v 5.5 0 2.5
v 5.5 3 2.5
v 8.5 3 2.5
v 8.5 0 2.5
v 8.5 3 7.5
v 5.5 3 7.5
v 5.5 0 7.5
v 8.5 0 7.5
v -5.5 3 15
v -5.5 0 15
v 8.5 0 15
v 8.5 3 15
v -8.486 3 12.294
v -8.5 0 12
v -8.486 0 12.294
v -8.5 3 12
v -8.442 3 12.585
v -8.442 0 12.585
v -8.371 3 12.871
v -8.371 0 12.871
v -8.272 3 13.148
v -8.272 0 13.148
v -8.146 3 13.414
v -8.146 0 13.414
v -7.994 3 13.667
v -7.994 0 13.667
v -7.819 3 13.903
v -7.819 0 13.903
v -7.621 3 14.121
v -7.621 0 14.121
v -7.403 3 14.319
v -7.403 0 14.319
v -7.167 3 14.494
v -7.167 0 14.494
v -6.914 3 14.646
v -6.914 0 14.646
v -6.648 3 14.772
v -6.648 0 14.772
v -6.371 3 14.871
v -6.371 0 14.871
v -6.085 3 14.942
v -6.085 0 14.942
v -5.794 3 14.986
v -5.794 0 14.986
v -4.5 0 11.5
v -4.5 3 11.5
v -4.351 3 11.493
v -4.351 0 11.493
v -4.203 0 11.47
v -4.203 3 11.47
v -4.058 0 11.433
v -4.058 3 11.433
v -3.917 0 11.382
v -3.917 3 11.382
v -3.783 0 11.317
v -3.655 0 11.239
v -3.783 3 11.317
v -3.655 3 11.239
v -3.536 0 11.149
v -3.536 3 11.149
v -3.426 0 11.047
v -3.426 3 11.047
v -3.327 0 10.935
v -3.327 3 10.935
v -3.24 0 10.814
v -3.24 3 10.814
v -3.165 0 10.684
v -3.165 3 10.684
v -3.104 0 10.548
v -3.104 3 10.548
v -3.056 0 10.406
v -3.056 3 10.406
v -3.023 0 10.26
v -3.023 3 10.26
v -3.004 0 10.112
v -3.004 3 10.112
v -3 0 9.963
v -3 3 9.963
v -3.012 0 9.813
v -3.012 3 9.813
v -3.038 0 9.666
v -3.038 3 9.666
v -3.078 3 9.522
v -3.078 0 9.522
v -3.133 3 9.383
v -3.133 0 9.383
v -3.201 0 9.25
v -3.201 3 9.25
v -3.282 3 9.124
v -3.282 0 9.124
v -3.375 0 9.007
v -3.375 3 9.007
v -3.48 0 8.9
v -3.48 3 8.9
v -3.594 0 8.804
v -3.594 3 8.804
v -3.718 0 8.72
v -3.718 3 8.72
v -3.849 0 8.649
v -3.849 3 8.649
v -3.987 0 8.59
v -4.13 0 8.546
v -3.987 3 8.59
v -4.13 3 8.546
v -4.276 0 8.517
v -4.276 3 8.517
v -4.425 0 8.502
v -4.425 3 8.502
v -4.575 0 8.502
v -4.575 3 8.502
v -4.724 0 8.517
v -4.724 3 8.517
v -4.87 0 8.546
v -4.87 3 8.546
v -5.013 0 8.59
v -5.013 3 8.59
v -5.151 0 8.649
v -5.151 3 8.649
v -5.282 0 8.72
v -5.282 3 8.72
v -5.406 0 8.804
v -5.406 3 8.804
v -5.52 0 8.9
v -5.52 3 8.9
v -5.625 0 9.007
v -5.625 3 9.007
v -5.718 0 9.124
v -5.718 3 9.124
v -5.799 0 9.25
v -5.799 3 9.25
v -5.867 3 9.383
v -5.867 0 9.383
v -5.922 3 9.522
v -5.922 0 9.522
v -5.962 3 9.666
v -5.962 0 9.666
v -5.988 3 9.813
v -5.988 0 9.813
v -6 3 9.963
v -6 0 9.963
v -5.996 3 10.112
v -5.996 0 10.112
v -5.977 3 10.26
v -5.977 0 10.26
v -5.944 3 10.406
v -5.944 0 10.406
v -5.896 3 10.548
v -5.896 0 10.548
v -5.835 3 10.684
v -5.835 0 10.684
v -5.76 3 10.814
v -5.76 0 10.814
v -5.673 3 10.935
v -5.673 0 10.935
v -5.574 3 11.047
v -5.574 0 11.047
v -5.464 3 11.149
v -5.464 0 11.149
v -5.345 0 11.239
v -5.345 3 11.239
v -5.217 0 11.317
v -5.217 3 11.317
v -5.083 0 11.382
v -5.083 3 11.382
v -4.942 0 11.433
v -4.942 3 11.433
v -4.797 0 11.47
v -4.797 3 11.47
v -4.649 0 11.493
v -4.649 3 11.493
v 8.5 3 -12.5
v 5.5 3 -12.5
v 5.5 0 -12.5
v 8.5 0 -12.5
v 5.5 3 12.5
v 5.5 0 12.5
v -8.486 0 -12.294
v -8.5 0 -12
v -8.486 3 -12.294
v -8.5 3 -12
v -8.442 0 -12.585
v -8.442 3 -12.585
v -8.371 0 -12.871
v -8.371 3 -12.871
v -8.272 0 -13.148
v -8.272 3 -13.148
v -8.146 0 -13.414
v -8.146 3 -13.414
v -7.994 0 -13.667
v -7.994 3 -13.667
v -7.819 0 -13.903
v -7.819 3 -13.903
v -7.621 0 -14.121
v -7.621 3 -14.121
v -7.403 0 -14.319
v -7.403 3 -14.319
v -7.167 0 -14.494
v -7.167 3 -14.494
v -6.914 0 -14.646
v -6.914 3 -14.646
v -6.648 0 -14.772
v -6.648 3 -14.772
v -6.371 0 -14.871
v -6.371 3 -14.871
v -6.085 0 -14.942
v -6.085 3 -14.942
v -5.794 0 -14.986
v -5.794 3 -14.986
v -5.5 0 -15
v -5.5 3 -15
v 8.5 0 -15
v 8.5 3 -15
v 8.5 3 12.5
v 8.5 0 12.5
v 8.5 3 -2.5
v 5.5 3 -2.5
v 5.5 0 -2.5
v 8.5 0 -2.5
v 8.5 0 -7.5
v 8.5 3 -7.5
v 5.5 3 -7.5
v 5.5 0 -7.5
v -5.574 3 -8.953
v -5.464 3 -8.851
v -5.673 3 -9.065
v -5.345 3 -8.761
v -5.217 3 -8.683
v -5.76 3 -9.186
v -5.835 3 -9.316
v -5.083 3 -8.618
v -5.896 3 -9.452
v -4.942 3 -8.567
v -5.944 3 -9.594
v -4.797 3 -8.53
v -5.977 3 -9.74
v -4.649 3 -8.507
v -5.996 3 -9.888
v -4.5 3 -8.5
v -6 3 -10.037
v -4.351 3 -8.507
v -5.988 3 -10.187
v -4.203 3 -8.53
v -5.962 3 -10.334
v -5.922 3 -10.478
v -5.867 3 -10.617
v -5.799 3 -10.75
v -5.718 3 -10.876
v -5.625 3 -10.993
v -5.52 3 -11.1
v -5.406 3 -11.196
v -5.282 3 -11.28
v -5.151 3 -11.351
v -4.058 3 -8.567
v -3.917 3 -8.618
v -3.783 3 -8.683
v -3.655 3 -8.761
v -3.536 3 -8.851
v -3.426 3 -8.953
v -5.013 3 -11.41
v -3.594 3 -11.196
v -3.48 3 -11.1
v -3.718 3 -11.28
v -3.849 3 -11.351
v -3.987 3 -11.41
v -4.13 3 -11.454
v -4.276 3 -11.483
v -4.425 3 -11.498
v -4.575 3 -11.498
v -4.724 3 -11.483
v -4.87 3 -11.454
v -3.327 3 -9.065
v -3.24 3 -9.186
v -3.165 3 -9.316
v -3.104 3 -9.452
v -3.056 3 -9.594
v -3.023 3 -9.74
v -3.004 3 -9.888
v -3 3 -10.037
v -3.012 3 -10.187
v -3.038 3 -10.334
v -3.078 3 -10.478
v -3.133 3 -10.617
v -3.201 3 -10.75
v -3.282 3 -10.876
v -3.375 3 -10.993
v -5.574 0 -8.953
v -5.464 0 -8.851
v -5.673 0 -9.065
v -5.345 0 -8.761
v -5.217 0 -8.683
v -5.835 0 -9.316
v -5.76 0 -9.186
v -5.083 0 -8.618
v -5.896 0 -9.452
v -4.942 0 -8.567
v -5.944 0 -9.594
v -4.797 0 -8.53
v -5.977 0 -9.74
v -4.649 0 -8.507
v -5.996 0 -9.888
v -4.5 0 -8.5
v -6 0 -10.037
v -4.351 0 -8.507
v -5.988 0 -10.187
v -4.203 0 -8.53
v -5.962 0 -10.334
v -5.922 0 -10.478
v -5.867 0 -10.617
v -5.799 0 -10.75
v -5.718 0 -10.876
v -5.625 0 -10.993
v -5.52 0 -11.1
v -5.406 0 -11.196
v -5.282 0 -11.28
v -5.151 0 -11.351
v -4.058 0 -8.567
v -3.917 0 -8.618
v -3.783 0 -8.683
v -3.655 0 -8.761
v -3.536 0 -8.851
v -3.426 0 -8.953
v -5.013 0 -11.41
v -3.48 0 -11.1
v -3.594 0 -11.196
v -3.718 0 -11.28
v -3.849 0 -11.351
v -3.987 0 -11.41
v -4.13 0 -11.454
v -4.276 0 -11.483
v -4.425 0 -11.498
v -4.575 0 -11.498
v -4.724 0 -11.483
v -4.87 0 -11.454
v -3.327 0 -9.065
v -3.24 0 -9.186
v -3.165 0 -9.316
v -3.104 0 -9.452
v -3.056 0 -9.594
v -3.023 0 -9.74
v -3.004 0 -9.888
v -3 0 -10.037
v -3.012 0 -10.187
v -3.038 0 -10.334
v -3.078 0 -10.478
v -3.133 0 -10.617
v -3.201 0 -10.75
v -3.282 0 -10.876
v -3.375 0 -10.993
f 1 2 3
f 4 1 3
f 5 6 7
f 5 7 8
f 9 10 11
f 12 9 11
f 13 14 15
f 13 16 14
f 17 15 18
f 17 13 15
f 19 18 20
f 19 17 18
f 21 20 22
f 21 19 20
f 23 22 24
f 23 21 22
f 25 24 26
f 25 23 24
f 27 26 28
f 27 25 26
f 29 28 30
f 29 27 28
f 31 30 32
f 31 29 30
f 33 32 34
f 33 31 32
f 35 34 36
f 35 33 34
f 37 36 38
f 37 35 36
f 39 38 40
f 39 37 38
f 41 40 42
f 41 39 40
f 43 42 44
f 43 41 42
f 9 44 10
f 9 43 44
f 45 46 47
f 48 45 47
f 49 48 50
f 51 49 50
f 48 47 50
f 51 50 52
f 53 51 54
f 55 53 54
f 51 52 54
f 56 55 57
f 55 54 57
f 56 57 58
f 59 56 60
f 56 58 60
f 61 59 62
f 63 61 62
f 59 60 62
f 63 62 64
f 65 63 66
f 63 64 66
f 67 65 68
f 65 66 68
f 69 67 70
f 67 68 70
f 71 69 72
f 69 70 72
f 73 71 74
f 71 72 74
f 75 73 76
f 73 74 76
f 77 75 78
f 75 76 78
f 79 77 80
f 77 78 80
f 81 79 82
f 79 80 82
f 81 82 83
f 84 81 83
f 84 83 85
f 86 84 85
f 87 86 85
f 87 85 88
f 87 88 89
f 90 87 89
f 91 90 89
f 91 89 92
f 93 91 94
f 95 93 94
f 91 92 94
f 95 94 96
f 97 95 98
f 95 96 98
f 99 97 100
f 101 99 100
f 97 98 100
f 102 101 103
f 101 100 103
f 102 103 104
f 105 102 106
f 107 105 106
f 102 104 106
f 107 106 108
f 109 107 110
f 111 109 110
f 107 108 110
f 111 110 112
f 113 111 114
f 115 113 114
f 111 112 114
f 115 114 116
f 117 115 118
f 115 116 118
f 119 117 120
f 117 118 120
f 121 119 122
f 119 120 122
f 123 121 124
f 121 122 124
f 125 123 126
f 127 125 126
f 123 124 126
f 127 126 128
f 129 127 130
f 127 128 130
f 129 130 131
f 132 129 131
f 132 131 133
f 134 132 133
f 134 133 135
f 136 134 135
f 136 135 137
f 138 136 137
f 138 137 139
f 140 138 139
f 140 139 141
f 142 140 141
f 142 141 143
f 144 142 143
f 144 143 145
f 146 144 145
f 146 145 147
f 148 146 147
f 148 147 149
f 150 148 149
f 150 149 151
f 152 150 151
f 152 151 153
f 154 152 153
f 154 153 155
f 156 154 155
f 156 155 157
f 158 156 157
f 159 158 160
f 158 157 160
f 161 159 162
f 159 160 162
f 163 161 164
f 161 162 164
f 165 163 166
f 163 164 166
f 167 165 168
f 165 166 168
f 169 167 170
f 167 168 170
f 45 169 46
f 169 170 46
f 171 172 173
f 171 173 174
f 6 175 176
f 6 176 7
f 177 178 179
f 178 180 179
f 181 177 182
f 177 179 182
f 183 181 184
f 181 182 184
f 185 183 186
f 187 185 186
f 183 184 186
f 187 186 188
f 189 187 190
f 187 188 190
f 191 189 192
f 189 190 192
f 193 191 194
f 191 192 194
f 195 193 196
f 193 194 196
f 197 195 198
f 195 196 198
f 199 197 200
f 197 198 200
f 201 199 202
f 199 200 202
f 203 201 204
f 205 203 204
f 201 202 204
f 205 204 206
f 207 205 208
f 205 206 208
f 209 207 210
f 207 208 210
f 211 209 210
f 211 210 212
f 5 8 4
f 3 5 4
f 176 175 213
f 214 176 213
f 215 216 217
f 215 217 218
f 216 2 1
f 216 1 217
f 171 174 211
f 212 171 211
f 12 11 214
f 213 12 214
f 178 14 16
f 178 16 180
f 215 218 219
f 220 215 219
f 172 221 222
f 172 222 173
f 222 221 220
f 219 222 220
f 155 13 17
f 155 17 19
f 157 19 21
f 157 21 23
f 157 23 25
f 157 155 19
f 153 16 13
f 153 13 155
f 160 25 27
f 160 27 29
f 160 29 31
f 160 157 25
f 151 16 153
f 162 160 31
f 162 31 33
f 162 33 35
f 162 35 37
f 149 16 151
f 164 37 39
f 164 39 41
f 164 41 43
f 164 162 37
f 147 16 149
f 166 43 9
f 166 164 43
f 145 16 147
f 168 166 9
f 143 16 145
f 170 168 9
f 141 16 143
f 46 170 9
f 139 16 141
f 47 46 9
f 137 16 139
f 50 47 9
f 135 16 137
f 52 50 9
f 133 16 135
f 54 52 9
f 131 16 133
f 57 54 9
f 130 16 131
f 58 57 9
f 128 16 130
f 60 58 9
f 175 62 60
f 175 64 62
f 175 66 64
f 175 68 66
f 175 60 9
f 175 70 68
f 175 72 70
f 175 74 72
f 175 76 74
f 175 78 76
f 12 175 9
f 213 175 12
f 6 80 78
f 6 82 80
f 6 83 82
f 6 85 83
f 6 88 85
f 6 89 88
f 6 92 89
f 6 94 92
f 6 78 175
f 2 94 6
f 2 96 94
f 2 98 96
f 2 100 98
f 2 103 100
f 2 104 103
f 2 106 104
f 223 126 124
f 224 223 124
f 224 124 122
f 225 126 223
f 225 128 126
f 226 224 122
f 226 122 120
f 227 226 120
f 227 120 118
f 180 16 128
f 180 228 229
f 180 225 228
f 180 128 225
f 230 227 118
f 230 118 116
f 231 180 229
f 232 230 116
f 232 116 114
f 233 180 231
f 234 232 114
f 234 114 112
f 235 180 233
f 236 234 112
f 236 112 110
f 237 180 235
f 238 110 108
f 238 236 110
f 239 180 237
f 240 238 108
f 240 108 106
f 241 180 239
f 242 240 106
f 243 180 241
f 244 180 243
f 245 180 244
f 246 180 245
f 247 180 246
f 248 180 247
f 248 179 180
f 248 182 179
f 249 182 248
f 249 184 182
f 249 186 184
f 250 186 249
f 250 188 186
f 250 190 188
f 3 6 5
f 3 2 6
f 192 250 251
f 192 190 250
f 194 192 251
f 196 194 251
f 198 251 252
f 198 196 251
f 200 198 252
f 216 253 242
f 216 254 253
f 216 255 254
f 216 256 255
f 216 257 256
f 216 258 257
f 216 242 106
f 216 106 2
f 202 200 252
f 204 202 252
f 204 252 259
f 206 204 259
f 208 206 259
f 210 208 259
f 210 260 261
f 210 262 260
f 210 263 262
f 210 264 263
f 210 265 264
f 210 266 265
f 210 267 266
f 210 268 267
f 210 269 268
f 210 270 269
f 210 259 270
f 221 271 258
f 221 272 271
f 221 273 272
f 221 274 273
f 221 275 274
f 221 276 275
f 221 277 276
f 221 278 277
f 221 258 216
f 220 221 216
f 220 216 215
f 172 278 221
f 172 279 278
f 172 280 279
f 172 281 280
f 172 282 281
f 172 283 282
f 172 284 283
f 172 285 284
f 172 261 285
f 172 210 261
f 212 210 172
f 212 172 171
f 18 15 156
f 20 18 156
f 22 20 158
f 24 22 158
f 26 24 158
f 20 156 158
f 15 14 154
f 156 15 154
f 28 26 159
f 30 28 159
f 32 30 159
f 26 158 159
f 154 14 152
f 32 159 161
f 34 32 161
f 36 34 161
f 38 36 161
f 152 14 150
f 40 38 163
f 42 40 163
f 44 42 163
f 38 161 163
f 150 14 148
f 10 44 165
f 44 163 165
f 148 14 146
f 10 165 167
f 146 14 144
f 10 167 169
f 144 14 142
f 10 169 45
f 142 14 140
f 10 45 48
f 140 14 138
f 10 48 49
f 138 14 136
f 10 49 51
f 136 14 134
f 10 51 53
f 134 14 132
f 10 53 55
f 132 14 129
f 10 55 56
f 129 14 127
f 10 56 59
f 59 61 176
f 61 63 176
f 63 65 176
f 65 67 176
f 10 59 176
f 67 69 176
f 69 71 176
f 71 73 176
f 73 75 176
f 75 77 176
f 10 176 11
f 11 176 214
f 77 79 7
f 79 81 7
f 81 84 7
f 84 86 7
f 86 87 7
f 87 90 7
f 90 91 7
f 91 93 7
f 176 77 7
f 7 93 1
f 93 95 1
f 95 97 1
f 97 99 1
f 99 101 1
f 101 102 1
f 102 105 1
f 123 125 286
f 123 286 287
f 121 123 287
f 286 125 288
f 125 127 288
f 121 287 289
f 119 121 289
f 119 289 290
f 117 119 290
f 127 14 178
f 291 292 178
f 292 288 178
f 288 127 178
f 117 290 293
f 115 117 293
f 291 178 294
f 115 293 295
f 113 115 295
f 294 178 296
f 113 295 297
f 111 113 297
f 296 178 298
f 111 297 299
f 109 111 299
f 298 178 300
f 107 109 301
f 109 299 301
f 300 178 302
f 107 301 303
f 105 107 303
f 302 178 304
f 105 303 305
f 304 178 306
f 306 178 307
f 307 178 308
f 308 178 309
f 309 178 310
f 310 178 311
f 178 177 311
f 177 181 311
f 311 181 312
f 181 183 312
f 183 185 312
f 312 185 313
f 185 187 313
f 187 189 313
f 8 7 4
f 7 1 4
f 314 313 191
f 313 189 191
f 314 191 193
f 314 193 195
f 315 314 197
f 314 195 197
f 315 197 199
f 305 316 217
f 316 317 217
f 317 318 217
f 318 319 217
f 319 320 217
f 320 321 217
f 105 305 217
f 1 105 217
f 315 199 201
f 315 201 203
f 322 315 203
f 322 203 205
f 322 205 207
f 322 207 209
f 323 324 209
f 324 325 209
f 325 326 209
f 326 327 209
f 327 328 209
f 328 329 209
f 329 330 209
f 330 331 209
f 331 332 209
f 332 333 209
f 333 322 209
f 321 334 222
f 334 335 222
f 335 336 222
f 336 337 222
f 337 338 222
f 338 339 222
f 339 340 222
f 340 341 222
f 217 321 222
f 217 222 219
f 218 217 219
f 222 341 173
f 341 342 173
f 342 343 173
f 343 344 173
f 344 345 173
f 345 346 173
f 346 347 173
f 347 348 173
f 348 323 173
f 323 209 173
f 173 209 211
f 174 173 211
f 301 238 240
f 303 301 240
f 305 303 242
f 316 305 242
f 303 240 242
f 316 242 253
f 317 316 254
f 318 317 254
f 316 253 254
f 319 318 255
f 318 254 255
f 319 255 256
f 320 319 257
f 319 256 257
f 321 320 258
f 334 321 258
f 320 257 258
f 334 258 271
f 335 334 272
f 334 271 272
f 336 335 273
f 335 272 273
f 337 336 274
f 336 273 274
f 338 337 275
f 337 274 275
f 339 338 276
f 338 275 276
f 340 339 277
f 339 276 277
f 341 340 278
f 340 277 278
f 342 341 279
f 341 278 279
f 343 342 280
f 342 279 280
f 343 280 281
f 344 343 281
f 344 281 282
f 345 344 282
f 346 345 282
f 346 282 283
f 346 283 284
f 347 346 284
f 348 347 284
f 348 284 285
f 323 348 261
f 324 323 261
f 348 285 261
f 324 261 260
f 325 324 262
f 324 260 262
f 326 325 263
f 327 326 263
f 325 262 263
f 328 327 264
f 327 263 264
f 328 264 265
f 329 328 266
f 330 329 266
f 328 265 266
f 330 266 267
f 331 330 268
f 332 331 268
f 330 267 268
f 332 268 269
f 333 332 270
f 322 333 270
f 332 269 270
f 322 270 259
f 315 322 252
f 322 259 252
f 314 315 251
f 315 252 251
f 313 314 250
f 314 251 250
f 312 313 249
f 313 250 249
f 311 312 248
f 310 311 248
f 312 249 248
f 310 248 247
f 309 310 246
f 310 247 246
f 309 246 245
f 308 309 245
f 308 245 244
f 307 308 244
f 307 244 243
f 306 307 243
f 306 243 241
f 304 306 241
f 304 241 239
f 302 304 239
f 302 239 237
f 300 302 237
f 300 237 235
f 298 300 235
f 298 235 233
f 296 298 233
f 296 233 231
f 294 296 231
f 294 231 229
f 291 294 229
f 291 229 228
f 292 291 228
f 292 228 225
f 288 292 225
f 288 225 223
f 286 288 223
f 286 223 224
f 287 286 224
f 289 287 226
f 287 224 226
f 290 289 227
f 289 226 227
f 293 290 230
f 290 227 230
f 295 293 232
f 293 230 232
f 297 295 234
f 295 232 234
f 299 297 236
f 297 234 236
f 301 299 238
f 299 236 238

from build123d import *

# Parameters (mm, degrees)
SKETCH1_W           = 17
SKETCH1_H           = 30
BOSS_EXTRUDE1_DEPTH = 3
SKETCH2_W           = 3
SKETCH2_H           = 5
CUT_EXTRUDE1_DEPTH  = 3
SKETCH3_R           = 1.5
CUT_EXTRUDE2_DEPTH  = 3
FILLET1_R           = 3


with BuildPart() as part:
    # Sketch1 → Boss-Extrude1 (new body)
    with BuildSketch(Plane(origin=(0, 0, 0), x_dir=(1, 0, 0), z_dir=(0, 1, 0))):
        Rectangle(SKETCH1_W, SKETCH1_H)
    extrude(amount=BOSS_EXTRUDE1_DEPTH)

    # Sketch2 → Cut-Extrude1 (cut)
    with BuildSketch(Plane(origin=(0, 3, 0), x_dir=(1, 0, 0), z_dir=(0, 1, 0))):
        with Locations((7, 10)):
            Rectangle(SKETCH2_W, SKETCH2_H)
        with Locations((7, 0)):
            Rectangle(SKETCH2_W, SKETCH2_H)
        with Locations((7, -10)):
            Rectangle(SKETCH2_W, SKETCH2_H)
    extrude(amount=-CUT_EXTRUDE1_DEPTH, mode=Mode.SUBTRACT)

    # Sketch3 → Cut-Extrude2 (cut)
    with BuildSketch(Plane(origin=(0, 3, 0), x_dir=(1, 0, 0), z_dir=(0, 1, 0))):
        with Locations(Location((-4.5, 10, 0), (0, 0, 270))):
            Circle(SKETCH3_R)
        with Locations(Location((-4.5, -10, 0), (0, 0, 270))):
            Circle(SKETCH3_R)
    extrude(amount=-CUT_EXTRUDE2_DEPTH, mode=Mode.SUBTRACT)

    # Fillet1
    fillet1_edges = [part.edges().sort_by_distance(p)[0] for p in [
        (-8.5, 1.5, 15),
        (-8.5, 1.5, -15),
    ]]
    fillet(fillet1_edges, radius=FILLET1_R)


solid = part.part
